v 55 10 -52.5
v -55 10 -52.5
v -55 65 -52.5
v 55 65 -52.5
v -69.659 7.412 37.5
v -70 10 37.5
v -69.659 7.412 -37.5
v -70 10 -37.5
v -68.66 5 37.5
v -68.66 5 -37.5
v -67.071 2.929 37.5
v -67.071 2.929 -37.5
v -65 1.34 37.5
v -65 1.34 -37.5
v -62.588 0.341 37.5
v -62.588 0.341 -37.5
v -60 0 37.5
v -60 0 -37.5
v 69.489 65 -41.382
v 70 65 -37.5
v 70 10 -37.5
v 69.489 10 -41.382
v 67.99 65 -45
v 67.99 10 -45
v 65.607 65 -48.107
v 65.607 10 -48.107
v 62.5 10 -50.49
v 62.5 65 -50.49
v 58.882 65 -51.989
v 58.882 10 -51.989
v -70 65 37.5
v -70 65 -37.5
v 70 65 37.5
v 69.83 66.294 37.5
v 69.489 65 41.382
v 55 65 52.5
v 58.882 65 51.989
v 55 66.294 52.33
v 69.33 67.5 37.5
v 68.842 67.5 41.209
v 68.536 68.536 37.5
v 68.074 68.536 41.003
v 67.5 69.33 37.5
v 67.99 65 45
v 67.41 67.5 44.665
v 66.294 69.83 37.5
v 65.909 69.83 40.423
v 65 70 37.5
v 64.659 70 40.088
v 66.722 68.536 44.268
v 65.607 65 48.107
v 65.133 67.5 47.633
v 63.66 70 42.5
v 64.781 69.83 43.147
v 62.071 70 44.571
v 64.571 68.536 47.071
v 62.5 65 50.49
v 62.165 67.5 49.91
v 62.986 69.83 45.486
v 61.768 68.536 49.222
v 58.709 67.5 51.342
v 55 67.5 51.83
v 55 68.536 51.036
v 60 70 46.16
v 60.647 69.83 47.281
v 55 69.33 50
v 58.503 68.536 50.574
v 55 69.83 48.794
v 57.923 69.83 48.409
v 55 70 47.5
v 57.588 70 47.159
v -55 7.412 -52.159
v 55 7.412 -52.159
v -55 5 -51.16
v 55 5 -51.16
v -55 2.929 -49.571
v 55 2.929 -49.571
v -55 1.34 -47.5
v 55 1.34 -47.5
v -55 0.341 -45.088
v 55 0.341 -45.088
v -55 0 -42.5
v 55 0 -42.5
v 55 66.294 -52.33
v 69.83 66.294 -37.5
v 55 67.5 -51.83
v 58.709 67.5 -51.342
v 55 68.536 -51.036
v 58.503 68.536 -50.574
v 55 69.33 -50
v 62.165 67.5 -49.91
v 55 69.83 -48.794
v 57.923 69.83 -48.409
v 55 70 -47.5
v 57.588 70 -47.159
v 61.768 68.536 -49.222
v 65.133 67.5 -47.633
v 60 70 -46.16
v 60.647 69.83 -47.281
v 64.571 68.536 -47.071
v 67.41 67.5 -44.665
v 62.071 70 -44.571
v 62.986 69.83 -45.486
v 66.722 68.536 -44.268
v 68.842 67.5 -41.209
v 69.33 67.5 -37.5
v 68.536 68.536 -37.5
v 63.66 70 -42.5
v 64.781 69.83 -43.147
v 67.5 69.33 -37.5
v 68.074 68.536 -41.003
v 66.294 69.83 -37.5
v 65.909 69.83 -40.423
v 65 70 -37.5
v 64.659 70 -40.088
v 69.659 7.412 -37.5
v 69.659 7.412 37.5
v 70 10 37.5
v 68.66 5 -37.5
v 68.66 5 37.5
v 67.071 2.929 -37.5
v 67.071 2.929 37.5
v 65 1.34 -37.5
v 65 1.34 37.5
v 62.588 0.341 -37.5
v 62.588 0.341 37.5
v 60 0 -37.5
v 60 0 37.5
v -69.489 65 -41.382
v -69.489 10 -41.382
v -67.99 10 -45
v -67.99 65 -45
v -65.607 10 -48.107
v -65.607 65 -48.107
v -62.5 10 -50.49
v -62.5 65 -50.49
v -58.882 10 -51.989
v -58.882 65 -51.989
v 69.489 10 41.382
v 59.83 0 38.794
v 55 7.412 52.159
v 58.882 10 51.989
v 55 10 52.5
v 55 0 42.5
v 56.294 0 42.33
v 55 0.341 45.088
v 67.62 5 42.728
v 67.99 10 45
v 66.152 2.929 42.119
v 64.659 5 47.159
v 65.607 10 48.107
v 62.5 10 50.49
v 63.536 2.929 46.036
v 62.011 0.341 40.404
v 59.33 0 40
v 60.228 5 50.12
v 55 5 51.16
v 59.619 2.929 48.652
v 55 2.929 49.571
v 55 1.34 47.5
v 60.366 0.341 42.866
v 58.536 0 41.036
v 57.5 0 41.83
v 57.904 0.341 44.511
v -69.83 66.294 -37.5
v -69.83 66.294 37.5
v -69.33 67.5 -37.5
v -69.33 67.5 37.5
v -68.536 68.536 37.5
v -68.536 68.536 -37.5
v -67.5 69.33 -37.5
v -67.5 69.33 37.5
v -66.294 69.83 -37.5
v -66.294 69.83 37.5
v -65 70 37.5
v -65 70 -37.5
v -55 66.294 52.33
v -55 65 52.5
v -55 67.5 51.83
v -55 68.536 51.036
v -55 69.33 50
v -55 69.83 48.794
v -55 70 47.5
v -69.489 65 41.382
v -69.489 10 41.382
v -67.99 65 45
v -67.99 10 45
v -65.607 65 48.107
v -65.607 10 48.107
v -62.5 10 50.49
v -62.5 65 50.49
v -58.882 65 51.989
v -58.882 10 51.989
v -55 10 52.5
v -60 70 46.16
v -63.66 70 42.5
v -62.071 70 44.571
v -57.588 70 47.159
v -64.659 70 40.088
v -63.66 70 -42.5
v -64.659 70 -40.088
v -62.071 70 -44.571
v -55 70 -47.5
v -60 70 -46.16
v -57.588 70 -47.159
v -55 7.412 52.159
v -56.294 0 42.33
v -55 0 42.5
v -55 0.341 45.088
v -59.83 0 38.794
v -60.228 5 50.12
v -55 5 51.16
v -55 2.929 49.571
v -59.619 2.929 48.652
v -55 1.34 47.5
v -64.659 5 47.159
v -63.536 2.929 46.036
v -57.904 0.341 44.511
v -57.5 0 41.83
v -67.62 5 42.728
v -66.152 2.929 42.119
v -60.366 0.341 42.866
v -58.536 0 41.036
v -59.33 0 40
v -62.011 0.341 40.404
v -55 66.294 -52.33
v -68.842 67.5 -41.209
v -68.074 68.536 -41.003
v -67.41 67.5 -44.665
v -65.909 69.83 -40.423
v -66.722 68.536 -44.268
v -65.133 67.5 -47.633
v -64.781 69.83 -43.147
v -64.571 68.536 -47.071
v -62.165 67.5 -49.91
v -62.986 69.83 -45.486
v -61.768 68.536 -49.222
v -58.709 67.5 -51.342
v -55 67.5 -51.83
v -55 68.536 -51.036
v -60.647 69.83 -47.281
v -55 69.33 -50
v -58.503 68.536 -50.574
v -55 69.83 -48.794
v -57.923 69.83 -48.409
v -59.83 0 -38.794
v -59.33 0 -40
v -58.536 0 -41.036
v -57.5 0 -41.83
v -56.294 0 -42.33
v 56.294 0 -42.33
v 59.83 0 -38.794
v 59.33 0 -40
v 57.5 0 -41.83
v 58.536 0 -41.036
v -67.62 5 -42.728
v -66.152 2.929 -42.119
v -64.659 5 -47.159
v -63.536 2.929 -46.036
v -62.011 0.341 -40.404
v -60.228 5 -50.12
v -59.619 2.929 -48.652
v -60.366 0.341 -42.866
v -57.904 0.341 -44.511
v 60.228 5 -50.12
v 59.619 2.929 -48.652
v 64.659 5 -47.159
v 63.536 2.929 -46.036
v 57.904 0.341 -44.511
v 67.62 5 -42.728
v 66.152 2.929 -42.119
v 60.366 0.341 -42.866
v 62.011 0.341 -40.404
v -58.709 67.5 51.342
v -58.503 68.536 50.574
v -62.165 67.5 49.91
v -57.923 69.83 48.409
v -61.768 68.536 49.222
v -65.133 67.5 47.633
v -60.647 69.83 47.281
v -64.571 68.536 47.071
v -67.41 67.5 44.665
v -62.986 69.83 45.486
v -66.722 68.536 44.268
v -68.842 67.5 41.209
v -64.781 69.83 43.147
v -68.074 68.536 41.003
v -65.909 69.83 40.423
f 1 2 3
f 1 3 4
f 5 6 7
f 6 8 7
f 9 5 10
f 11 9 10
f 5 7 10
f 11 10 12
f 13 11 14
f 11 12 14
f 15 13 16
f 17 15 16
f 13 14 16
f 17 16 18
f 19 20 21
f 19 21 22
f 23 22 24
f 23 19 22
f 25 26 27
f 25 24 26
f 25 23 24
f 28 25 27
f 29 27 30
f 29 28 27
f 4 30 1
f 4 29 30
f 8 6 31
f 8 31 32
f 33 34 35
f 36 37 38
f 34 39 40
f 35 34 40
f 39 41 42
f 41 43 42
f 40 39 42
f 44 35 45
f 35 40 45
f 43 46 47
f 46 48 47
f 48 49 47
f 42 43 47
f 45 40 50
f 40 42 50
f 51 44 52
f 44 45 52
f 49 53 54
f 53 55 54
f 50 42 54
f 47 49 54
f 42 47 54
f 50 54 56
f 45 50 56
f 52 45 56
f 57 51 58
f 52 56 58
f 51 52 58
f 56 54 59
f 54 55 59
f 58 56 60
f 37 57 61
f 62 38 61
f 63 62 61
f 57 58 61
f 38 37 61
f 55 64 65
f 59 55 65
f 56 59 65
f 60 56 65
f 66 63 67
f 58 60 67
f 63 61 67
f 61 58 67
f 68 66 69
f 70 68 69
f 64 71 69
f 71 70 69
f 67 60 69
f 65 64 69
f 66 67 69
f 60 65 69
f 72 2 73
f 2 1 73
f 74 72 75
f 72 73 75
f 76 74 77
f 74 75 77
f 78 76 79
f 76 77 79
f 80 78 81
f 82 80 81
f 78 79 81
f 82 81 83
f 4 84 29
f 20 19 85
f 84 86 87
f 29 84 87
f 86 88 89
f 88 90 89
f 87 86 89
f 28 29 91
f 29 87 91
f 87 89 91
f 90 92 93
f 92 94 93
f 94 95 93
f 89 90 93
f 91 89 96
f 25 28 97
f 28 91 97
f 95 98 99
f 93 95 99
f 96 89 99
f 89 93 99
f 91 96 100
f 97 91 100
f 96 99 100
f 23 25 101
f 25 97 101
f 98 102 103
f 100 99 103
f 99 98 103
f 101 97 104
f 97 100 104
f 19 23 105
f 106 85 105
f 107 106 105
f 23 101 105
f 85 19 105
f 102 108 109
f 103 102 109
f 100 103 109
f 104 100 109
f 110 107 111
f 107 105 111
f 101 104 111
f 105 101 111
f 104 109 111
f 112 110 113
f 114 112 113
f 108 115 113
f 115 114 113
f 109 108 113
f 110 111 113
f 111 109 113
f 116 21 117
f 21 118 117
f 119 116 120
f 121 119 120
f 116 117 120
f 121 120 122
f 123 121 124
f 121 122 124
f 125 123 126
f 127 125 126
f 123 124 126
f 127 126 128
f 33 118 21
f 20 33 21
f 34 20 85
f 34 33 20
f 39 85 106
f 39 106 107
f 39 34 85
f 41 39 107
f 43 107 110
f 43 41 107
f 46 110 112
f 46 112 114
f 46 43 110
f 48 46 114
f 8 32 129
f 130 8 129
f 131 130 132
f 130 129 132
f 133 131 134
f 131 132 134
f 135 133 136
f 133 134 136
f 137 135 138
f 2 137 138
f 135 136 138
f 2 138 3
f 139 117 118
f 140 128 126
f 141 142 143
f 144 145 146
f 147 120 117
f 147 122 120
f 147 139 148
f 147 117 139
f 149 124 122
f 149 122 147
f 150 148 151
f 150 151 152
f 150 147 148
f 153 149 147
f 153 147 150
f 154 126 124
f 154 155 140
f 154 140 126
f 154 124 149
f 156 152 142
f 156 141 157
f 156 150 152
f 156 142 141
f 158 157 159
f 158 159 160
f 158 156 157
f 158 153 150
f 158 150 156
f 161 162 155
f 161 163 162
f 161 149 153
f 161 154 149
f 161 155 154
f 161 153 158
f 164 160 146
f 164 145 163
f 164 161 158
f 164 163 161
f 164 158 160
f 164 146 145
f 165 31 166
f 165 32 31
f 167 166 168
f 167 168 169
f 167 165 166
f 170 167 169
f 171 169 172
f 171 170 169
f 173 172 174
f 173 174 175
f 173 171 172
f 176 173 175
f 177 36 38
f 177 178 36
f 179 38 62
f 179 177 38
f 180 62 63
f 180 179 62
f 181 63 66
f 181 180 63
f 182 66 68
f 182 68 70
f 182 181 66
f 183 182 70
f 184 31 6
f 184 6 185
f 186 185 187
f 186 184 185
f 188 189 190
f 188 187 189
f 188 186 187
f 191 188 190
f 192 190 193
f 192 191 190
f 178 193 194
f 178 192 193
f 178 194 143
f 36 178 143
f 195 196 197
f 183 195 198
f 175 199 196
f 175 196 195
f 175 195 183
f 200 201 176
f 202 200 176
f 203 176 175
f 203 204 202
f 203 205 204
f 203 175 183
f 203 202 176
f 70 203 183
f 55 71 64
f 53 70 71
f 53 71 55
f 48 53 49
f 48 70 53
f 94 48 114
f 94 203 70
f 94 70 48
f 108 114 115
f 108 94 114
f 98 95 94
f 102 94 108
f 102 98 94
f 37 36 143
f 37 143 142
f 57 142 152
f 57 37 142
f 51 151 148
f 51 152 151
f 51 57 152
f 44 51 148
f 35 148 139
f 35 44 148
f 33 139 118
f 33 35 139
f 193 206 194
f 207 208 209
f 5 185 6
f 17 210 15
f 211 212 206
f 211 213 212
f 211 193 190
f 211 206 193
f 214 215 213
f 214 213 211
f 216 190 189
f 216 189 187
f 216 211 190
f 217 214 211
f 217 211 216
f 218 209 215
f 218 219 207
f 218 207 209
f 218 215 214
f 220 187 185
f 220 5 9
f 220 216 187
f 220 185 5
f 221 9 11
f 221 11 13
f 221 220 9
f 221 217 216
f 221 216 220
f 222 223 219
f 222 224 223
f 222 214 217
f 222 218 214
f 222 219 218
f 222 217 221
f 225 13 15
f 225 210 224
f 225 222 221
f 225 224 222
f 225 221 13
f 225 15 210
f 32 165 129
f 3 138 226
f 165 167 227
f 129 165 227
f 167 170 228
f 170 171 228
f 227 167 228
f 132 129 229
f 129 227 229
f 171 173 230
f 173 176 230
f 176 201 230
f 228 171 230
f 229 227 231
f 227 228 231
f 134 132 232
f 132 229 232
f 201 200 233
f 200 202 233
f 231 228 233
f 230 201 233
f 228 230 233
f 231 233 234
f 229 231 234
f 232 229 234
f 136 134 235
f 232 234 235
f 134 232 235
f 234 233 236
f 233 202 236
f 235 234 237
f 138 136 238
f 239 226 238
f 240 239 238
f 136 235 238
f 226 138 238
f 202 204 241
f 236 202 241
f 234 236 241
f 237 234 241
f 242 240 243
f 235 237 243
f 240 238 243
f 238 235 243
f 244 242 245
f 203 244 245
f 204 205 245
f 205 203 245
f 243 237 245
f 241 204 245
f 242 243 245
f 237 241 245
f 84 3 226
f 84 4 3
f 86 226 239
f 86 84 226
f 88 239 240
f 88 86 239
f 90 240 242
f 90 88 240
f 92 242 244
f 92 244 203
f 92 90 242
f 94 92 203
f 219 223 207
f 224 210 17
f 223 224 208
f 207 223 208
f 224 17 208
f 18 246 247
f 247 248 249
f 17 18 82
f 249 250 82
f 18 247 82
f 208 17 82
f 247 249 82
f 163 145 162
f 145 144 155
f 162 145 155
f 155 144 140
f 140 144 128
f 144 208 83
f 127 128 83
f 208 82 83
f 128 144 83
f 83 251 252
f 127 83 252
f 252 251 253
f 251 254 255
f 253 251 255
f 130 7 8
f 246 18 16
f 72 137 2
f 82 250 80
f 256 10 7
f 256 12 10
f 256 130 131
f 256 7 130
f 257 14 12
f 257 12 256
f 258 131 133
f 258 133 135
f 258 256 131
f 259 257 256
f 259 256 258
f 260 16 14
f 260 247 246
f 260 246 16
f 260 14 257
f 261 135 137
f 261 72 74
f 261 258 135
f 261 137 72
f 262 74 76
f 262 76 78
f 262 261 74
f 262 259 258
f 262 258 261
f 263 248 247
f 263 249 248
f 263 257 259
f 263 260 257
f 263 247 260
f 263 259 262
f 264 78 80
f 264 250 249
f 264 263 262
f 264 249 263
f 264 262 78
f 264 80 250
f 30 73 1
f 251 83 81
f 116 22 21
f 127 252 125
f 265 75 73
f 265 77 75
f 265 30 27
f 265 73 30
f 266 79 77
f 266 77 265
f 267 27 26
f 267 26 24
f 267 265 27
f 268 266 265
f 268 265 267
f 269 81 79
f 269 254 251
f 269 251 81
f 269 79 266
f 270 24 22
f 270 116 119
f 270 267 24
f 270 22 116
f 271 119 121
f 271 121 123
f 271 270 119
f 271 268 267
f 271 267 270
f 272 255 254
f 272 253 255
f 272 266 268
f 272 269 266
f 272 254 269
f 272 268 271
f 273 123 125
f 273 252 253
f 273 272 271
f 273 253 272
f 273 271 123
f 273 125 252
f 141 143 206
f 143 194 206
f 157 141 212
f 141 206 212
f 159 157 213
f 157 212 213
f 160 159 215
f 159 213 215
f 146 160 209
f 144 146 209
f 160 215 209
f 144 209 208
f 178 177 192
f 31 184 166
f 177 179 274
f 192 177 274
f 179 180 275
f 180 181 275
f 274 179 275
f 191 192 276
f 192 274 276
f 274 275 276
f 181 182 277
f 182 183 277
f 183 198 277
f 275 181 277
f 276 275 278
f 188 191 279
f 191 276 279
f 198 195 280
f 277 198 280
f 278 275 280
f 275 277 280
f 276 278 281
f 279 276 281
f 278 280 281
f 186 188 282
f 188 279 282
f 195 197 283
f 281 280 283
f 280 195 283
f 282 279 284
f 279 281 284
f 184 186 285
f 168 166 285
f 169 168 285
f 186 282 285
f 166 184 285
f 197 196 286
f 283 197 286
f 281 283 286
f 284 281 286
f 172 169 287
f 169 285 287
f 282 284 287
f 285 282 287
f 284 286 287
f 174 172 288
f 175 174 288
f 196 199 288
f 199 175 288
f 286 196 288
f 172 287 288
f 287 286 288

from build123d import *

# Parameters (mm, degrees)
SKETCH_1_W      = 140
SKETCH_1_H      = 105
EXTRUDE_1_DEPTH = 70
FILLET_1_R      = 15
FILLET_2_R      = 10
FILLET_3_R      = 5


with BuildPart() as part:
    # 草图1 → 凸台-拉伸1 (new body)
    with BuildSketch(Plane(origin=(0, 0, 0), x_dir=(1, 0, 0), z_dir=(0, 1, 0))):
        Rectangle(SKETCH_1_W, SKETCH_1_H)
    extrude(amount=EXTRUDE_1_DEPTH)

    # 圆角1
    fillet_1_edges = [part.edges().sort_by_distance(p)[0] for p in [
        (-70, 35, -52.5),
        (70, 35, -52.5),
        (70, 35, 52.5),
        (-70, 35, 52.5),
    ]]
    fillet(fillet_1_edges, radius=FILLET_1_R)

    # 圆角2
    fillet_2_edges = [part.edges().sort_by_distance(p)[0] for p in [
        (-70, 0, 0),
        (0, 0, -52.5),
        (70, 0, 0),
        (0, 0, 52.5),
        (-65.606601718, 0, 48.106601718),
        (65.606601718, 0, 48.106601718),
        (65.606601718, 0, -48.106601718),
        (-65.606601718, 0, -48.106601718),
    ]]
    fillet(fillet_2_edges, radius=FILLET_2_R)

    # 圆角3
    fillet_3_edges = [part.edges().sort_by_distance(p)[0] for p in [
        (-70, 70, 0),
        (0, 70, -52.5),
        (0, 70, 52.5),
        (70, 70, 0),
        (-65.606601718, 70, 48.106601718),
        (65.606601718, 70, 48.106601718),
        (65.606601718, 70, -48.106601718),
        (-65.606601718, 70, -48.106601718),
    ]]
    fillet(fillet_3_edges, radius=FILLET_3_R)


solid = part.part
